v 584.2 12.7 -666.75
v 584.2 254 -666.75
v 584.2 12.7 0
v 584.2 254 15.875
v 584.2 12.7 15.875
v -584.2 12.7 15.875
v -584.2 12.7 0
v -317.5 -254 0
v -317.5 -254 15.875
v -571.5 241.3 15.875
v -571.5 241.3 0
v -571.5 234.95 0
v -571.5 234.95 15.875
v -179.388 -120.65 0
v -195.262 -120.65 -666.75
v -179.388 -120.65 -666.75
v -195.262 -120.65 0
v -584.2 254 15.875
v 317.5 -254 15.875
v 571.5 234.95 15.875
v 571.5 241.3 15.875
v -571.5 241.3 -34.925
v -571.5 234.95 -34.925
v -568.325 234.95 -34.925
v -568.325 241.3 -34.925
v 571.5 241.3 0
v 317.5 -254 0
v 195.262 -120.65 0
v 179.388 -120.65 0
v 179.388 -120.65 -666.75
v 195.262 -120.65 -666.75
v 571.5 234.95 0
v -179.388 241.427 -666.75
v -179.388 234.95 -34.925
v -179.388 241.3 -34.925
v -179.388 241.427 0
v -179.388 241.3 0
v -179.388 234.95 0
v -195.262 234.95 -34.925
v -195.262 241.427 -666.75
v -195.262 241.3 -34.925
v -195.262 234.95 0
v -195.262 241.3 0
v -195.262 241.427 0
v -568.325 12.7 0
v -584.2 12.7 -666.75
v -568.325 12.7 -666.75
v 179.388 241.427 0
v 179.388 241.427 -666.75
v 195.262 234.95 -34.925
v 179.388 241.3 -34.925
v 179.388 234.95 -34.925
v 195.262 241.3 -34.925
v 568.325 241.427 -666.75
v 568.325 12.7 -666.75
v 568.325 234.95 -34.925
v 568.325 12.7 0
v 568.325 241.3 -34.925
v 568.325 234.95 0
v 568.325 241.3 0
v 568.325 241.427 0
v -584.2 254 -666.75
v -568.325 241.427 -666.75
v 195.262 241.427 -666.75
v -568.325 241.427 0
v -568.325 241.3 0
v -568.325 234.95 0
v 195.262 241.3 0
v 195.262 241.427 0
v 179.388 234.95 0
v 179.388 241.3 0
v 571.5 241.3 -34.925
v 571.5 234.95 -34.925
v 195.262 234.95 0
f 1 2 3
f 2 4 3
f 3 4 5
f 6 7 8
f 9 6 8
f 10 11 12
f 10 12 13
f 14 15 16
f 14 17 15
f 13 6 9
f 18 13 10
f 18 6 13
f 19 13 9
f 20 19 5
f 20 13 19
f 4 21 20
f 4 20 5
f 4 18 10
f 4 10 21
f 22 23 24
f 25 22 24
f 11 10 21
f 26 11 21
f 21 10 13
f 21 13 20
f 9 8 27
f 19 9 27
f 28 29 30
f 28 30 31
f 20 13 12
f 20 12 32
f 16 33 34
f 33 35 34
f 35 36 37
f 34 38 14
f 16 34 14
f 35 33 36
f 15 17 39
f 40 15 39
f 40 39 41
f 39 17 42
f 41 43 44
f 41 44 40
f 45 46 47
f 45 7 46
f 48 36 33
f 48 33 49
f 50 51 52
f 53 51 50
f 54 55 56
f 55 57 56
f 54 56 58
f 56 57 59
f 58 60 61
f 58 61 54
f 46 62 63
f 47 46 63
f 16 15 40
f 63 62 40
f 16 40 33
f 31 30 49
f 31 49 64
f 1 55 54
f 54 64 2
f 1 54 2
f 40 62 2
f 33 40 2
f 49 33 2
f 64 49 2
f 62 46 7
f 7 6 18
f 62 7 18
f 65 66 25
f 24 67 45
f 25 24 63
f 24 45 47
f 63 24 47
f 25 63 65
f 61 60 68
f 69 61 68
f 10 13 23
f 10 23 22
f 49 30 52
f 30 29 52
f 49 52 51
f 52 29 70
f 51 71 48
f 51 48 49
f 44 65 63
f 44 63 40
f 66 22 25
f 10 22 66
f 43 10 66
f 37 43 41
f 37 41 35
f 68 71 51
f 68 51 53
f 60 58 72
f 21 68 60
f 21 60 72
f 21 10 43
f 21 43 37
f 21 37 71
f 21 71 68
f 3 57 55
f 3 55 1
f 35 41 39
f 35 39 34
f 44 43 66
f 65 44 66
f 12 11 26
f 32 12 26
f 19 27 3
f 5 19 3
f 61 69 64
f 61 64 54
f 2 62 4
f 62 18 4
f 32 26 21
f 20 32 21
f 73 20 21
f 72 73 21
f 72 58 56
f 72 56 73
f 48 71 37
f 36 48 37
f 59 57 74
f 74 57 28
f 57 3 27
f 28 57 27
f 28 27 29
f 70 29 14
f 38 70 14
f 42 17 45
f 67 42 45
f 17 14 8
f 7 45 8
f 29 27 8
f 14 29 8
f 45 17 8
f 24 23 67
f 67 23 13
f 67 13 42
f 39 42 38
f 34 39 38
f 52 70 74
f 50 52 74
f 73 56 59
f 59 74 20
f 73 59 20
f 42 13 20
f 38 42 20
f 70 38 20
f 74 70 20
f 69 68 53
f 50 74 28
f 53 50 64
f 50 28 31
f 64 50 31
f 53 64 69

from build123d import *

# Parameters (mm, degrees)
F1_DEPTH  = 15.875
F3_DEPTH  = 666.75
F4_W      = 373.0625
F4_H      = 304.8
F4_H_2    = 50.8
F5_DEPTH  = 225.298
F6_W      = 373.0625
F6_H      = 304.8
F6_H_2    = 50.8
F7_DEPTH  = 225.298
F8_W      = 358.775
F8_H      = 304.8
F8_H_2    = 50.8
F9_DEPTH  = 358.648
F10_R     = 12.7
F11_DEPTH = 25.4
F12_R     = 12.7
F13_DEPTH = 25.4
F14_R     = 12.7
F15_DEPTH = 25.4
F16_R     = 12.7
F17_DEPTH = 25.4
F18_R     = 12.7
F19_DEPTH = 25.4
F20_R     = 12.7
F21_DEPTH = 25.4
F22_R     = 12.7
F23_DEPTH = 25.4
F24_R     = 12.7
F25_DEPTH = 25.4
F26_R     = 12.7
F27_DEPTH = 25.4
F28_W     = 358.775
F28_H     = 3.175
F29_DEPTH = 358.775
F30_W     = 358.775
F30_H     = 3.175
F31_DEPTH = 358.775
F32_W     = 373.0625
F32_H     = 3.175
F33_DEPTH = 225.425
F34_W     = 373.0625
F34_H     = 3.175
F35_DEPTH = 225.425
F36_W     = 373.0625
F36_H     = 3.175
F37_DEPTH = 225.425
F38_W     = 373.0625
F38_H     = 3.175
F39_DEPTH = 225.425
F40_W     = 1143
F40_H     = 6.35
F41_DEPTH = 50.8
F43_DEPTH = 228.6
F45_DEPTH = 228.6
F47_DEPTH = 361.95
F48_W     = 1143
F48_H     = 15.875
F49_DEPTH = 6.35


with BuildPart() as f1:
    # F0 (on Top) → F1 (new body)
    with BuildSketch(Plane.XY):
        Polygon((584.2, 254), (-584.2, 254), (-584.2, 12.7), (-317.5, -254), (317.5, -254), (584.2, 12.7), align=None)
    extrude(amount=F1_DEPTH)

    # F2 (on face) → F3 (join)
    with BuildSketch(Plane(origin=(0, 0, 0), x_dir=(1, 0, 0), z_dir=(0, 0, -1))):
        Polygon((-568.325, -12.7), (-584.2, -12.7), (-584.2, -254), (-568.325, -254), (568.325, -254), (584.2, -254), (584.2, -12.7), (568.325, -12.7), (568.325, -238.125), (195.2625, -238.125), (179.3875, -238.125), (-179.3875, -238.125), (-195.2625, -238.125), (-568.325, -238.125), align=None)
        Polygon((-195.2625, 120.65), (-195.2625, -238.125), (-179.3875, -238.125), (-179.3875, 120.65), (-187.325, 120.65), align=None)
        Polygon((179.3875, 120.65), (179.3875, -238.125), (195.2625, -238.125), (195.2625, 120.65), (187.325, 120.65), align=None)
    extrude(amount=F3_DEPTH)

    # F4 (on face) → F5 (join)
    with BuildSketch(Plane.XZ.offset(-238.125)):
        with Locations((-381.79375, -514.35)):
            Rectangle(F4_W, F4_H)
        with Locations((-381.79375, -206.375)):
            Rectangle(F4_W, F4_H)
        with Locations((-381.79375, -25.4)):
            Rectangle(F4_W, F4_H_2)
    extrude(amount=F5_DEPTH)

    # F6 (on face) → F7 (join)
    with BuildSketch(Plane.XZ.offset(-238.125)):
        with Locations((381.79375, -514.35)):
            Rectangle(F6_W, F6_H)
        with Locations((381.79375, -206.375)):
            Rectangle(F6_W, F6_H)
        with Locations((381.79375, -25.4)):
            Rectangle(F6_W, F6_H_2)
    extrude(amount=F7_DEPTH)

    # F8 (on face) → F9 (join)
    with BuildSketch(Plane.XZ.offset(-238.125)):
        with Locations((0, -514.35)):
            Rectangle(F8_W, F8_H)
        with Locations((0, -206.375)):
            Rectangle(F8_W, F8_H)
        with Locations((0, -25.4)):
            Rectangle(F8_W, F8_H_2)
    extrude(amount=F9_DEPTH)

    # F10 (on face) → F11 (join)
    with BuildSketch(Plane.XZ.offset(-12.827)):
        with Locations((-381.79375, -514.35)):
            Circle(F10_R)
    extrude(amount=F11_DEPTH)

    # F12 (on face) → F13 (join)
    with BuildSketch(Plane.XZ.offset(-12.827)):
        with Locations((-381.79375, -206.375)):
            Circle(F12_R)
    extrude(amount=F13_DEPTH)

    # F14 (on face) → F15 (join)
    with BuildSketch(Plane.XZ.offset(-12.827)):
        with Locations((-381.79375, -25.4)):
            Circle(F14_R)
    extrude(amount=F15_DEPTH)

    # F16 (on face) → F17 (join)
    with BuildSketch(Plane.XZ.offset(120.523)):
        with Locations((0, -514.35)):
            Circle(F16_R)
    extrude(amount=F17_DEPTH)

    # F18 (on face) → F19 (join)
    with BuildSketch(Plane.XZ.offset(120.523)):
        with Locations((0, -206.375)):
            Circle(F18_R)
    extrude(amount=F19_DEPTH)

    # F20 (on face) → F21 (join)
    with BuildSketch(Plane.XZ.offset(120.523)):
        with Locations((0, -25.4)):
            Circle(F20_R)
    extrude(amount=F21_DEPTH)

    # F22 (on face) → F23 (join)
    with BuildSketch(Plane.XZ.offset(-12.827)):
        with Locations((381.79375, -514.35)):
            Circle(F22_R)
    extrude(amount=F23_DEPTH)

    # F24 (on face) → F25 (join)
    with BuildSketch(Plane.XZ.offset(-12.827)):
        with Locations((381.79375, -206.375)):
            Circle(F24_R)
    extrude(amount=F25_DEPTH)

    # F26 (on face) → F27 (join)
    with BuildSketch(Plane.XZ.offset(-12.827)):
        with Locations((381.79375, -25.4)):
            Circle(F26_R)
    extrude(amount=F27_DEPTH)

    # F28 (on face) → F29 (join)
    with BuildSketch(Plane.XZ.offset(-238.125)):
        with Locations((0, -360.3625)):
            Rectangle(F28_W, F28_H)
    extrude(amount=F29_DEPTH)

    # F30 (on face) → F31 (join)
    with BuildSketch(Plane.XZ.offset(-238.125)):
        with Locations((0, -52.3875)):
            Rectangle(F30_W, F30_H)
    extrude(amount=F31_DEPTH)

    # F32 (on face) → F33 (join)
    with BuildSketch(Plane.XZ.offset(-238.125)):
        with Locations((-381.79375, -360.3625)):
            Rectangle(F32_W, F32_H)
    extrude(amount=F33_DEPTH)

    # F34 (on face) → F35 (join)
    with BuildSketch(Plane.XZ.offset(-238.125)):
        with Locations((-381.79375, -52.3875)):
            Rectangle(F34_W, F34_H)
    extrude(amount=F35_DEPTH)

    # F36 (on face) → F37 (join)
    with BuildSketch(Plane.XZ.offset(-238.125)):
        with Locations((381.79375, -52.3875)):
            Rectangle(F36_W, F36_H)
    extrude(amount=F37_DEPTH)

    # F38 (on face) → F39 (join)
    with BuildSketch(Plane.XZ.offset(-238.125)):
        with Locations((381.79375, -360.3625)):
            Rectangle(F38_W, F38_H)
    extrude(amount=F39_DEPTH)

    # F40 (on face) → F41 (cut)
    with BuildSketch(Plane.XY.offset(15.875)):
        with Locations((0, 238.125)):
            Rectangle(F40_W, F40_H)
    extrude(amount=-F41_DEPTH, mode=Mode.SUBTRACT)

    # F42 (on face) → F43 (cut, symmetric)
    with BuildSketch(Plane.XZ.offset(-12.827)):
        Polygon((-195.2625, 0), (-568.325, 0), (-568.325, -754.009426), (-195.2625, -758.519292), align=None)
    extrude(amount=F43_DEPTH, both=True, mode=Mode.SUBTRACT)

    # F44 (on face) → F45 (cut, symmetric)
    with BuildSketch(Plane.XZ.offset(-12.827)):
        Polygon((568.325, 0), (195.2625, 0), (195.2625, -771.9118), (568.325, -734.96139), align=None)
    extrude(amount=F45_DEPTH, both=True, mode=Mode.SUBTRACT)

    # F46 (on face) → F47 (cut, symmetric)
    with BuildSketch(Plane.XZ.offset(120.523)):
        Polygon((179.3875, 0), (-179.3875, 0), (-179.3875, -746.490955), (179.3875, -735.204995), align=None)
    extrude(amount=F47_DEPTH, both=True, mode=Mode.SUBTRACT)


with BuildPart() as f49:
    # F48 (on face) → F49 (new body)
    with BuildSketch(Plane.XZ.offset(-241.3)):
        with Locations((0, 7.9375)):
            Rectangle(F48_W, F48_H)
    extrude(amount=F49_DEPTH)


solid = Compound([f1.part, f49.part])
